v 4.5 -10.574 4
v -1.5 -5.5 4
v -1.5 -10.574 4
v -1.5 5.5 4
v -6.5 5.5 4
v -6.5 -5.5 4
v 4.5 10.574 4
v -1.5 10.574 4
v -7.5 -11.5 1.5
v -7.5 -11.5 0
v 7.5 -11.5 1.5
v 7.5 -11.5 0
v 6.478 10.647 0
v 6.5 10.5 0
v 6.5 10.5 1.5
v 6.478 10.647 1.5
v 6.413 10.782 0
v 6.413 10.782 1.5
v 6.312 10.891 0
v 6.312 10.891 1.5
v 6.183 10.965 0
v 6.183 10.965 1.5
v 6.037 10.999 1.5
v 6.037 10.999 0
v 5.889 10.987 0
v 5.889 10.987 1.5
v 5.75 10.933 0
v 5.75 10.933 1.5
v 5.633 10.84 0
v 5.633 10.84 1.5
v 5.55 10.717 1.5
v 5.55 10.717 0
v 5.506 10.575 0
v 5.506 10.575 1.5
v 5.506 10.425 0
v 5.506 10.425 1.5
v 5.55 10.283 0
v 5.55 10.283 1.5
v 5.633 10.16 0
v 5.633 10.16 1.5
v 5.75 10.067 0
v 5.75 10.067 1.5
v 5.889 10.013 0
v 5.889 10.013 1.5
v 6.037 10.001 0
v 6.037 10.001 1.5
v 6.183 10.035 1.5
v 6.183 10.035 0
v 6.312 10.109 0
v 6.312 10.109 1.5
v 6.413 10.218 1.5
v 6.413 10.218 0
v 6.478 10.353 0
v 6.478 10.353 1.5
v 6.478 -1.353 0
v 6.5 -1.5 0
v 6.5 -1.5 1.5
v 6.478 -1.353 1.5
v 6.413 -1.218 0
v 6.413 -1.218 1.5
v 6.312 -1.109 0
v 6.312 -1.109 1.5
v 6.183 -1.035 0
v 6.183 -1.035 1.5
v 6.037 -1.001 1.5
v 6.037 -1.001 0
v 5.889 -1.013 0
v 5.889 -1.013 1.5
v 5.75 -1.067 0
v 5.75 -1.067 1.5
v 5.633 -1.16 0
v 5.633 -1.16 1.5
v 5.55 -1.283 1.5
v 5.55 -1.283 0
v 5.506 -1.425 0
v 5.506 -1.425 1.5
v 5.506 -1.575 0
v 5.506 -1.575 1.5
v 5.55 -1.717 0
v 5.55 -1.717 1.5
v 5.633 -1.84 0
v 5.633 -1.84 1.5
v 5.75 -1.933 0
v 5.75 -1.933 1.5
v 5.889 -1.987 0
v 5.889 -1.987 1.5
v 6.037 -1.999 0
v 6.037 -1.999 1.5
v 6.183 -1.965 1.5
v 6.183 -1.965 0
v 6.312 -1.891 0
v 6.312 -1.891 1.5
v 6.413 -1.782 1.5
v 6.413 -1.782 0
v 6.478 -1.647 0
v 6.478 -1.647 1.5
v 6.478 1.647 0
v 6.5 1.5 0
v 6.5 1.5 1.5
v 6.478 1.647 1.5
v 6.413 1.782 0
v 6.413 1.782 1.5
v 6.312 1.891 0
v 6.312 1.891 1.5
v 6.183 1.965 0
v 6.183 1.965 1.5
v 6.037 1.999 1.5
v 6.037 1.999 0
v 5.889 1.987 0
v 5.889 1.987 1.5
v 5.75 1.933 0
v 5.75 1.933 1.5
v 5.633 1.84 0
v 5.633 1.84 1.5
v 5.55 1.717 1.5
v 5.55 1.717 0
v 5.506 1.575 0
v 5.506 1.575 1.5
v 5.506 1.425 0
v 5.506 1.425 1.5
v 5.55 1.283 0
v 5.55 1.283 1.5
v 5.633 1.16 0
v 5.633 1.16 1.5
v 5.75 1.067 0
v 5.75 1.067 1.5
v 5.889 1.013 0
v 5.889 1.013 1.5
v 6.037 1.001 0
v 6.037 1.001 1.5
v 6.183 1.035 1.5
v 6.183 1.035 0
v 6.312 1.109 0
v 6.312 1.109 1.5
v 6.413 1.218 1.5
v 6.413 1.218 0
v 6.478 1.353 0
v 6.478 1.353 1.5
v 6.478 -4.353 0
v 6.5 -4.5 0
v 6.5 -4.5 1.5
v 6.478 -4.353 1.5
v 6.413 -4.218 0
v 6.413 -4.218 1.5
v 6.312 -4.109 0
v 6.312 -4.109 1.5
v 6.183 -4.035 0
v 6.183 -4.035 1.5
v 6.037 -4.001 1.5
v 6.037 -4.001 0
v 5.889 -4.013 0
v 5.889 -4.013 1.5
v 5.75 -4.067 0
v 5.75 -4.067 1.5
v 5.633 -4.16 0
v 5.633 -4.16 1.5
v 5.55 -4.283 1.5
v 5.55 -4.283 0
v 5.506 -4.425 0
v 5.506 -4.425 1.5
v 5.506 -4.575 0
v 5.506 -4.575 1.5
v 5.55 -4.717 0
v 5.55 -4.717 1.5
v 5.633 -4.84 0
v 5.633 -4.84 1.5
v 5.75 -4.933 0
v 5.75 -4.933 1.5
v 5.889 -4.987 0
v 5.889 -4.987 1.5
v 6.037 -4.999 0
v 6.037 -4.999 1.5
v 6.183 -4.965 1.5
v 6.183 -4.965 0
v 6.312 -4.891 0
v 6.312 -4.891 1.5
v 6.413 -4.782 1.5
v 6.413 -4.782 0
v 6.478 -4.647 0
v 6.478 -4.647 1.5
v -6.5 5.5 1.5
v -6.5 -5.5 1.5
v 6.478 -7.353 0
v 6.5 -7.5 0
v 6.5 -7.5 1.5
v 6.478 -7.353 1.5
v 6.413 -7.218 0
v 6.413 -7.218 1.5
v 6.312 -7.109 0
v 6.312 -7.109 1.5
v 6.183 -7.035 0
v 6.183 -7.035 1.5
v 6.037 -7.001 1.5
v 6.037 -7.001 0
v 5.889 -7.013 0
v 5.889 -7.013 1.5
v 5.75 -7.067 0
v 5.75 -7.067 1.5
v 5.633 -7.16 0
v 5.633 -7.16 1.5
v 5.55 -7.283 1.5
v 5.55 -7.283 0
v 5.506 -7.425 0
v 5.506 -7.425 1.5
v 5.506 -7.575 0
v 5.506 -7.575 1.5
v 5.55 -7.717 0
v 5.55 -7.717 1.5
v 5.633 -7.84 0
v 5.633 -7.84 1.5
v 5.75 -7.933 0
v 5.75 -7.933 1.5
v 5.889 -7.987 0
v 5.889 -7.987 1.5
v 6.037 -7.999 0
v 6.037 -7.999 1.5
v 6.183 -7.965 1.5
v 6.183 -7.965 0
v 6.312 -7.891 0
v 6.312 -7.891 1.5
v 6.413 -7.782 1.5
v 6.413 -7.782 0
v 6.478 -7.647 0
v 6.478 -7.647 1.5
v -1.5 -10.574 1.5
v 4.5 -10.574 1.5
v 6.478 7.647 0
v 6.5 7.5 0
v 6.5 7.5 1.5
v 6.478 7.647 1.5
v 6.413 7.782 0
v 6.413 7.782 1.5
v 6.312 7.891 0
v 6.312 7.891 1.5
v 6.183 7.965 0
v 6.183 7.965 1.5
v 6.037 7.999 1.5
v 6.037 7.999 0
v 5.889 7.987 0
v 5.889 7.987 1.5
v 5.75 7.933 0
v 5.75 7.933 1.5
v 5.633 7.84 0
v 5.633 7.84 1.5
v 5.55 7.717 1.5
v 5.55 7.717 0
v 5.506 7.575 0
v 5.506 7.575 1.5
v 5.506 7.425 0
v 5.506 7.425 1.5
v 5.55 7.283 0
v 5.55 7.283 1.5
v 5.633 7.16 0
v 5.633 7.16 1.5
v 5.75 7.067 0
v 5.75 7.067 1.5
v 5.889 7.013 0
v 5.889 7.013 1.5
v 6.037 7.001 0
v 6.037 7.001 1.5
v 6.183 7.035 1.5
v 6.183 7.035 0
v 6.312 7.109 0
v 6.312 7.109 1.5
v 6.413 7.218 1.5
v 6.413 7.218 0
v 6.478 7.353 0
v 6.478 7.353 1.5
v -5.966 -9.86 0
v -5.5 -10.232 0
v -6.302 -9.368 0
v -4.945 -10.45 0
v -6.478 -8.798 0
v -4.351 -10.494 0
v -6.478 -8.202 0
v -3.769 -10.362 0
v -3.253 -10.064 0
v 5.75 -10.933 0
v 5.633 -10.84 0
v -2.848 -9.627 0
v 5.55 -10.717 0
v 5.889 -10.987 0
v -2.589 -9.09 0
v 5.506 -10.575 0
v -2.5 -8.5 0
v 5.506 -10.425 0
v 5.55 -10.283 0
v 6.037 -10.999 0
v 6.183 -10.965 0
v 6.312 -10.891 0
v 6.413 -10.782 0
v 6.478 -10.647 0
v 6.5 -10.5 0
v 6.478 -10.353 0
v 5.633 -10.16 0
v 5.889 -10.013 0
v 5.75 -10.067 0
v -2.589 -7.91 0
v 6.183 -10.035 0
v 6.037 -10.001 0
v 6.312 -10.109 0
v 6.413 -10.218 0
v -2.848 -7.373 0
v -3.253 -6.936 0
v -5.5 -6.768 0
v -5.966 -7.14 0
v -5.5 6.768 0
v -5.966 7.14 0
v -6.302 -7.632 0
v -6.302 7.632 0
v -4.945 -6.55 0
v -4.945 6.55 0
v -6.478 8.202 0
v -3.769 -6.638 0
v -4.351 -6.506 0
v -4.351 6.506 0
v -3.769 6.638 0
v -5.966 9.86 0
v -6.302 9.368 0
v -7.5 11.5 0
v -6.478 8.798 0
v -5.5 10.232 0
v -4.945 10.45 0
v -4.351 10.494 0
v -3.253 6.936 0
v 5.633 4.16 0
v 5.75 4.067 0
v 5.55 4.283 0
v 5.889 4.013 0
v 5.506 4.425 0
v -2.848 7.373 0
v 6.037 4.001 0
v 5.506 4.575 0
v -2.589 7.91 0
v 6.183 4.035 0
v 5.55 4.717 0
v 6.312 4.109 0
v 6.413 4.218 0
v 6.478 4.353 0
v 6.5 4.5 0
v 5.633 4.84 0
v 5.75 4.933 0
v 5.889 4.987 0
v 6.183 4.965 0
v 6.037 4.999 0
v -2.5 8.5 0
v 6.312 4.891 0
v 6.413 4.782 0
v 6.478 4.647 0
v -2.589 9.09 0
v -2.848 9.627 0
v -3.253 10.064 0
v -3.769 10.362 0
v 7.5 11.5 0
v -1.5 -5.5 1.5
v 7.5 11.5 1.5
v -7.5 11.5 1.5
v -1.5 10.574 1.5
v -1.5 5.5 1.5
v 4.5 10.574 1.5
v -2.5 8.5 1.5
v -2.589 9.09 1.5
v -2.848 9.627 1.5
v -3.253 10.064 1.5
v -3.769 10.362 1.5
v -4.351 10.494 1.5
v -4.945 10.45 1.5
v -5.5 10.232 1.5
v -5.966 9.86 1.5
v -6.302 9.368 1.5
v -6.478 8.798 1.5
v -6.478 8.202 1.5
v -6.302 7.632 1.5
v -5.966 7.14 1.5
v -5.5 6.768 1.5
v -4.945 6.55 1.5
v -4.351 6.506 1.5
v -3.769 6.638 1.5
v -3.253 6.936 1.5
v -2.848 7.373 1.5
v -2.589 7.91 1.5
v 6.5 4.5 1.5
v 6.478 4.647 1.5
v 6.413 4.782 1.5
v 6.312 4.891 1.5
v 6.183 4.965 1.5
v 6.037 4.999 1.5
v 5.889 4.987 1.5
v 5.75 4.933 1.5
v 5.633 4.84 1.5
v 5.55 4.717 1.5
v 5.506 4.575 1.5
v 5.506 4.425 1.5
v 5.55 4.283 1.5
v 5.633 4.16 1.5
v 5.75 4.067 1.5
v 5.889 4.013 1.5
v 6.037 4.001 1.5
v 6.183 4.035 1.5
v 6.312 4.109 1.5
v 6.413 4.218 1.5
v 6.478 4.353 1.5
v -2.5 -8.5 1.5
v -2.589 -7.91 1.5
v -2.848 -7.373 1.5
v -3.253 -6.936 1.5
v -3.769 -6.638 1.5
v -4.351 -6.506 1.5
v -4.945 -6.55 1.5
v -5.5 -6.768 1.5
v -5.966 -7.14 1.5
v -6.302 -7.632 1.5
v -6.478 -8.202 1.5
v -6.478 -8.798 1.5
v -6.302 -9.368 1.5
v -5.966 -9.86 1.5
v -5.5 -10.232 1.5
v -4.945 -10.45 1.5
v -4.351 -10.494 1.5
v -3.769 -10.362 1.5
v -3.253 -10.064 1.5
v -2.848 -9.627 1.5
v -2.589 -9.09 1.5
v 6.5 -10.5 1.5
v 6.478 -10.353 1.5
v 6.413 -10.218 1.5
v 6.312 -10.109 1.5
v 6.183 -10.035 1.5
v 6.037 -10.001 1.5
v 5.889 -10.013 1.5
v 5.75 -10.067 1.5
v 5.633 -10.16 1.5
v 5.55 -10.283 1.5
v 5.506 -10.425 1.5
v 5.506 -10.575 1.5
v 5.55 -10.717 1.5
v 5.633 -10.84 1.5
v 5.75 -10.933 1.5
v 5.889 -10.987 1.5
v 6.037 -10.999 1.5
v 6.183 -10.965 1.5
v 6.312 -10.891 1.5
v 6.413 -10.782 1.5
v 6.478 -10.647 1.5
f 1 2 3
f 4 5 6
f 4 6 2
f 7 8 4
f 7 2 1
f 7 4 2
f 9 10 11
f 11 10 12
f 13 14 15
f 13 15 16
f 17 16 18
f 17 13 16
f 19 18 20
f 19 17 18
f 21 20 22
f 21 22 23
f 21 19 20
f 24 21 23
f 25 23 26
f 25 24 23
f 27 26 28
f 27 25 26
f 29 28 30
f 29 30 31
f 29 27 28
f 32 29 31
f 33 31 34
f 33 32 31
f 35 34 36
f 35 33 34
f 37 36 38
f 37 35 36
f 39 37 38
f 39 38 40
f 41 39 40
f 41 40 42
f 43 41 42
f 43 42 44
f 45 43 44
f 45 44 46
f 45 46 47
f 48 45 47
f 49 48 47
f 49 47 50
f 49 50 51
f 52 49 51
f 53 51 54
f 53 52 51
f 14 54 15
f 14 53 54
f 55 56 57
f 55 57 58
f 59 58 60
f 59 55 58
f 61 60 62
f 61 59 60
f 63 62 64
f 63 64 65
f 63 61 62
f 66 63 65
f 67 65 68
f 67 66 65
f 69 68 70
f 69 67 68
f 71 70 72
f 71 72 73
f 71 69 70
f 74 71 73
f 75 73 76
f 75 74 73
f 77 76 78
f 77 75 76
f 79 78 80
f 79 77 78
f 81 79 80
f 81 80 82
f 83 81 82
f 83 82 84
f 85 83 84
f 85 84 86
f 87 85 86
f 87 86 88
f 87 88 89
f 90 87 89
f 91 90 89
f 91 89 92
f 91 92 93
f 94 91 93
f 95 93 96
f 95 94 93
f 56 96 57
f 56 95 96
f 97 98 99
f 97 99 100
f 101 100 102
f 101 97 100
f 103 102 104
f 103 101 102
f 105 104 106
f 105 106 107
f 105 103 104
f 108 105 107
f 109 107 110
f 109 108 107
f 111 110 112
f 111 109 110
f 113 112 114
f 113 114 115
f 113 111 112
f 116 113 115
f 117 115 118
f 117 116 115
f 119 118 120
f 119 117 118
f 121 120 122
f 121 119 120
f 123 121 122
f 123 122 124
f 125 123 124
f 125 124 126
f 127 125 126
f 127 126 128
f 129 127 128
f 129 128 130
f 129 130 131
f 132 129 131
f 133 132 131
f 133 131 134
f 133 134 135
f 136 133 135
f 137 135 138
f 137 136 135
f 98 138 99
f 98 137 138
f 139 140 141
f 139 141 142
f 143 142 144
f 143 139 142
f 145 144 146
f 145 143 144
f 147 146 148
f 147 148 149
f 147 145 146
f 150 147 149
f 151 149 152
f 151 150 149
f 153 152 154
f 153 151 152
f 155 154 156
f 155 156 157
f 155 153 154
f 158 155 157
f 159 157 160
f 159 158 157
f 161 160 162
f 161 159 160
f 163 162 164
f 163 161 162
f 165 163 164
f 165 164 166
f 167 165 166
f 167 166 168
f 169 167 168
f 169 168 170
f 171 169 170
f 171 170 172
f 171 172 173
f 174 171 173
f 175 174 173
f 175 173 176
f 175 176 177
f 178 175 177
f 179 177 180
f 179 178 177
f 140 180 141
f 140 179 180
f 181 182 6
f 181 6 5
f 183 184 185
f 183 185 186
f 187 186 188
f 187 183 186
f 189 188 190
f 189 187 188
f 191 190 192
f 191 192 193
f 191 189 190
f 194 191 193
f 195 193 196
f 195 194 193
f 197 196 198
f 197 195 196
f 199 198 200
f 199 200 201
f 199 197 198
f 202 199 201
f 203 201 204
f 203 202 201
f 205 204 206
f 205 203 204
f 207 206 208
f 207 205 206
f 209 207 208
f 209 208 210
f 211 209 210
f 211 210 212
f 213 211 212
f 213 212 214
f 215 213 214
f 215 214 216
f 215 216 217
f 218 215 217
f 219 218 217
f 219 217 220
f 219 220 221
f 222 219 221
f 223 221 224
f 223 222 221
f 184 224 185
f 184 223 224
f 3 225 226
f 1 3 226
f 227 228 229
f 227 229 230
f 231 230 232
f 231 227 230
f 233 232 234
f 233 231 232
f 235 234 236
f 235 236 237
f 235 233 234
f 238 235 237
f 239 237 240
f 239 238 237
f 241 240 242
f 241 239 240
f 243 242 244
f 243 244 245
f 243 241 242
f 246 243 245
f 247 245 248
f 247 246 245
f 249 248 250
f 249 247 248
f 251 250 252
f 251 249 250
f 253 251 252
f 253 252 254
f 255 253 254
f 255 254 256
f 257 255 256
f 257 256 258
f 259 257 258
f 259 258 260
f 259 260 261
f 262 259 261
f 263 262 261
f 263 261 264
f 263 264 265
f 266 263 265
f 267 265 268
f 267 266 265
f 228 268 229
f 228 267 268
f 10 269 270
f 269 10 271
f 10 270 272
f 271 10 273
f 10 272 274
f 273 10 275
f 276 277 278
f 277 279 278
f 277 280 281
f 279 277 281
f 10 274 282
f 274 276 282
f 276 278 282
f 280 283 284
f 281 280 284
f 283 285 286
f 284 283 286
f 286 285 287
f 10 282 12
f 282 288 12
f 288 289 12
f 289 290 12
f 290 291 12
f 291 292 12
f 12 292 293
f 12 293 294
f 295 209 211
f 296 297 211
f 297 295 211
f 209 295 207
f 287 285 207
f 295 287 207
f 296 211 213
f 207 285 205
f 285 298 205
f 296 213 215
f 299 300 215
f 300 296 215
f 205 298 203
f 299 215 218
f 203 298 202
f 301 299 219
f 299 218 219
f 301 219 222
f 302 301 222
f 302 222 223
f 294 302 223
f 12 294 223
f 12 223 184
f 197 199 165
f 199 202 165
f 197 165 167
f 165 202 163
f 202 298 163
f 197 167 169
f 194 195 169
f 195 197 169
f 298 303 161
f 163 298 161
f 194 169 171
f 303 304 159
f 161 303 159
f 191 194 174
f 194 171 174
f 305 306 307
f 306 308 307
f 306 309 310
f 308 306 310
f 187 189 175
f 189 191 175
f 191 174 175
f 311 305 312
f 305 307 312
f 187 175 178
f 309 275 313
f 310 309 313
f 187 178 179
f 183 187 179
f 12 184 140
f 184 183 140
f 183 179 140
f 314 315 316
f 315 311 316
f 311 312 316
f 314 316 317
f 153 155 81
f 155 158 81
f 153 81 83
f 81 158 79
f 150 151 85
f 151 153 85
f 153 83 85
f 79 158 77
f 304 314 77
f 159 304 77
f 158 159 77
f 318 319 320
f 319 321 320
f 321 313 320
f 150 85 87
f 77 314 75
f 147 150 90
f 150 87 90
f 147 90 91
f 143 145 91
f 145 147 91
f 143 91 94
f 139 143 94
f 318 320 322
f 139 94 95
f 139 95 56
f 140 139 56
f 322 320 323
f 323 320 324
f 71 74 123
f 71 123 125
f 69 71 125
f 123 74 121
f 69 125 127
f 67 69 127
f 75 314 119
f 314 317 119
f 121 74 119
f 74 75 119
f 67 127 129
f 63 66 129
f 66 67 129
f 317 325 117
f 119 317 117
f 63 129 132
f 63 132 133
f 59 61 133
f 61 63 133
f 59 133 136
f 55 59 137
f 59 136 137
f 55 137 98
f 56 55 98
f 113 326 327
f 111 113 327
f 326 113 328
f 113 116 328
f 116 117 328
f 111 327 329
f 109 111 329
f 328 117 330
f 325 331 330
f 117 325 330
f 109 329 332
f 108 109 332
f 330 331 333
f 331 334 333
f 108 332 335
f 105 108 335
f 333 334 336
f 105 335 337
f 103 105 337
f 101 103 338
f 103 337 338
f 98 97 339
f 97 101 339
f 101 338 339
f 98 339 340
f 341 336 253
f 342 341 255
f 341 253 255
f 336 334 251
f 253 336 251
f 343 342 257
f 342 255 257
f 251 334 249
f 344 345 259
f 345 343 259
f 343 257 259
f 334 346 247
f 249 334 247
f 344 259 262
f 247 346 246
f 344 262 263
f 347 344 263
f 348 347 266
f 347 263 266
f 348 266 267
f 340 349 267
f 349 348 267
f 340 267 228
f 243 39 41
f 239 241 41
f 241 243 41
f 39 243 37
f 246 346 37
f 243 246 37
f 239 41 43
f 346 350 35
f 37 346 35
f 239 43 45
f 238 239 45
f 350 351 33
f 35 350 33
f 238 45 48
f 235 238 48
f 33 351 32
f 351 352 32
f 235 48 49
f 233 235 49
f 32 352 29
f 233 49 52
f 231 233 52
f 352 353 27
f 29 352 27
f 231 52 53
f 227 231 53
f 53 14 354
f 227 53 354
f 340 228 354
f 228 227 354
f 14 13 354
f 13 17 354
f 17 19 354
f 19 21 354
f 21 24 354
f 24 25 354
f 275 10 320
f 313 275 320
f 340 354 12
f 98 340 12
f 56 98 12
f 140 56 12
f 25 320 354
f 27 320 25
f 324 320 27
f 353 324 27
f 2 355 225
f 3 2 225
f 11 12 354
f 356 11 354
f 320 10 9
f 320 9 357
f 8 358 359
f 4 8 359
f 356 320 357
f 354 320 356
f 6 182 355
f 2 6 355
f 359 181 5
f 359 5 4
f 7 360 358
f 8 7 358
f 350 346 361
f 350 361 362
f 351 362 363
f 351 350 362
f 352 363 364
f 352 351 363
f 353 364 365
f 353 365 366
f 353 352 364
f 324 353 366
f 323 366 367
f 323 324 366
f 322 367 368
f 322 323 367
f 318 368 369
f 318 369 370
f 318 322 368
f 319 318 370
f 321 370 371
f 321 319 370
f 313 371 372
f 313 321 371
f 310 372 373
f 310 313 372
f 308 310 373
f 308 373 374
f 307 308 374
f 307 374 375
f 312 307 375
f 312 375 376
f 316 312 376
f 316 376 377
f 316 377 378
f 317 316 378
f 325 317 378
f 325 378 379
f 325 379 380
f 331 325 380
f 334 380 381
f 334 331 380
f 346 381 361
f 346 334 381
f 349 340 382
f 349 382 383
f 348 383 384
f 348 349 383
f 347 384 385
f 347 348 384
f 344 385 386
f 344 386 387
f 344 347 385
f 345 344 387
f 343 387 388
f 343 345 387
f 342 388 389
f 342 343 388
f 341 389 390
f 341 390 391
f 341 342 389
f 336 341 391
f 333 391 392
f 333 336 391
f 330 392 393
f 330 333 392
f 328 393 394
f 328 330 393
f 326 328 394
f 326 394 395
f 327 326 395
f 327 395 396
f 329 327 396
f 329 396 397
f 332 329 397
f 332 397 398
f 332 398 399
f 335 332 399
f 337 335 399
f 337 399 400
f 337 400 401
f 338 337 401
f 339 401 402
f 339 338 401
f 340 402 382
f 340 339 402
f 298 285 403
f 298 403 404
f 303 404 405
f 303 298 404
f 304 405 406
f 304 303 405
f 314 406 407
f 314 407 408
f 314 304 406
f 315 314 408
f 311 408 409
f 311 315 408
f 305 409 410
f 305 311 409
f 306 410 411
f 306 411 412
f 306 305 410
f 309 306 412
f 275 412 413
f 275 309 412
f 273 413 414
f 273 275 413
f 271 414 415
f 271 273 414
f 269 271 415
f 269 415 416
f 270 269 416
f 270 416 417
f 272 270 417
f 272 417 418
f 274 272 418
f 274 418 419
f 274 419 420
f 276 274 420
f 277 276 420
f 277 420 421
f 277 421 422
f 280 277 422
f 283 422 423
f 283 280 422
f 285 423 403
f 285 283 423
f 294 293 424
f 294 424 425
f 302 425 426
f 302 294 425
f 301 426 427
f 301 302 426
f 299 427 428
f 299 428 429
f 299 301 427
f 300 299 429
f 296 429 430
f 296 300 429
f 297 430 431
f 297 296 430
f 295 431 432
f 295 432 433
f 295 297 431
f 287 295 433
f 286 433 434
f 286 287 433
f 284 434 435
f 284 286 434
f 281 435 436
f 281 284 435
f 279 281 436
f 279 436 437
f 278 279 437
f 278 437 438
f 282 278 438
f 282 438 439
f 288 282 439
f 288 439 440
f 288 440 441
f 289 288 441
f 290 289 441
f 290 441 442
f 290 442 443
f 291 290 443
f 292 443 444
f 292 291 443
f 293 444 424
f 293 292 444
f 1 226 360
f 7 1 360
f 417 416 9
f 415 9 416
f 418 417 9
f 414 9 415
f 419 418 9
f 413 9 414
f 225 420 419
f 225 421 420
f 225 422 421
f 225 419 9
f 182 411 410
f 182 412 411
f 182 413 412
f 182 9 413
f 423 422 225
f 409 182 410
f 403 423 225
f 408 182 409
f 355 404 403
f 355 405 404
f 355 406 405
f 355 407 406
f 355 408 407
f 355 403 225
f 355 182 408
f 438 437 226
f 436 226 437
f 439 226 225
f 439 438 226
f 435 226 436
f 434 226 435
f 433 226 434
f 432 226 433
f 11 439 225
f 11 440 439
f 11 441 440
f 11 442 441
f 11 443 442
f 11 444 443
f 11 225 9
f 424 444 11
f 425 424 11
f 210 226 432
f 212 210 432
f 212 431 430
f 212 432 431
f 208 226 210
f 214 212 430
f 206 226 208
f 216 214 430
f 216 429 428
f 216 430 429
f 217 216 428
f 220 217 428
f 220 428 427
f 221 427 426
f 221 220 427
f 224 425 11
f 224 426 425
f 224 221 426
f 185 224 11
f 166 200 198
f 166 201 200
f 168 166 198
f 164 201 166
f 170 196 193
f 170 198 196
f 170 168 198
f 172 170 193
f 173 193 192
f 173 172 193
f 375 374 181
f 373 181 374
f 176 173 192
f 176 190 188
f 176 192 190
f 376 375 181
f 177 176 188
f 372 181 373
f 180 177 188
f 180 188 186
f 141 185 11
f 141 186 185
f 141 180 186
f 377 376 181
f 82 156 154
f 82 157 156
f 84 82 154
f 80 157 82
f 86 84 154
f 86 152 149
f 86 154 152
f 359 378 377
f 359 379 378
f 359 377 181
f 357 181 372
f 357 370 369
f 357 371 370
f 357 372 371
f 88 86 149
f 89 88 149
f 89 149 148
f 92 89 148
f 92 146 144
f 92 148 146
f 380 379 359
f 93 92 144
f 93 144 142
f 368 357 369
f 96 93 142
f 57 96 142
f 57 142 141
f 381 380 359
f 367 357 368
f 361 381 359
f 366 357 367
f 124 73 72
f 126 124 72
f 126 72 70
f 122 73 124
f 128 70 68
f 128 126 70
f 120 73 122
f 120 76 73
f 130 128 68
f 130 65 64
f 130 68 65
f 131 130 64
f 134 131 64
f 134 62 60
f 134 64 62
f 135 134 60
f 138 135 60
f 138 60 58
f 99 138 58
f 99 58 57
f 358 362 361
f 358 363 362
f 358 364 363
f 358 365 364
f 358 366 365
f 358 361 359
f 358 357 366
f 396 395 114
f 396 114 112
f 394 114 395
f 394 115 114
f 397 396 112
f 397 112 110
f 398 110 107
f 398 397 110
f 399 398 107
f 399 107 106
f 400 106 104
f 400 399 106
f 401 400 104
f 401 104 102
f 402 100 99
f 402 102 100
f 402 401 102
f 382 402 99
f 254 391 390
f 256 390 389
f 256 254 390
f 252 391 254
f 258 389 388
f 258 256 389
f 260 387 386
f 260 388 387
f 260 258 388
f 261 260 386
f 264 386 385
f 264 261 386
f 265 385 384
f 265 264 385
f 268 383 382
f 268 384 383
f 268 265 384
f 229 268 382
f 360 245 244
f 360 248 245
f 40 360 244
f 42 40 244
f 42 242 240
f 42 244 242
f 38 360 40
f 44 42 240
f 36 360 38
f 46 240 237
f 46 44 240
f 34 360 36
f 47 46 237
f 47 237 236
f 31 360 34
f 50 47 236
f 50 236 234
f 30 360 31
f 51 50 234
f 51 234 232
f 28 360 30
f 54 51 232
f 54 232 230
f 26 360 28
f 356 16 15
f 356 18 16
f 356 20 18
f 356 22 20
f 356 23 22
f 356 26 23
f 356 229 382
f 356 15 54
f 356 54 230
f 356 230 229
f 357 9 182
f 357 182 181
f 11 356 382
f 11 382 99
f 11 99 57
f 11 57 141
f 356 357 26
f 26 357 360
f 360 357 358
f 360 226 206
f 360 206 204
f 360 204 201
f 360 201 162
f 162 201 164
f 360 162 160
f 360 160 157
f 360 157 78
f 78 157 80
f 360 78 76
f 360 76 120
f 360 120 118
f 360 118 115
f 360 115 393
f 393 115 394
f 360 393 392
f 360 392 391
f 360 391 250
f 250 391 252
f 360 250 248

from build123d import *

# Parameters (mm, degrees)
F0_W     = 5
F0_H     = 11
F1_DEPTH = 4
F0_W_2   = 15
F0_H_2   = 23
F0_R     = 2
F0_R_2   = 0.5
F2_DEPTH = 1.5


with BuildPart() as f1:
    # F0 (on Top) → F1 (new body)
    with BuildSketch(Plane.XY):
        Polygon((-1.5, -10.573518), (4.5, -10.573518), (4.5, 10.573518), (-1.5, 10.573518), (-1.5, 5.5), (-1.5, -5.5), align=None)
        with Locations((-4, 0)):
            Rectangle(F0_W, F0_H)
    extrude(amount=F1_DEPTH)

    # F0 (on Top) → F2 (join)
    with BuildSketch(Plane.XY):
        Rectangle(F0_W_2, F0_H_2)
        with Locations((-4.5, -8.5)):
            Circle(F0_R, mode=Mode.SUBTRACT)
        with Locations((6, -10.5)):
            Circle(F0_R_2, mode=Mode.SUBTRACT)
        with Locations((6, -7.5)):
            Circle(F0_R_2, mode=Mode.SUBTRACT)
        with Locations((6, -4.5)):
            Circle(F0_R_2, mode=Mode.SUBTRACT)
        with Locations((6, -1.5)):
            Circle(F0_R_2, mode=Mode.SUBTRACT)
        Polygon((4.5, 10.573518), (4.5, -10.573518), (-1.5, -10.573518), (-1.5, -5.5), (-6.5, -5.5), (-6.5, 5.5), (-1.5, 5.5), (-1.5, 10.573518), align=None, mode=Mode.SUBTRACT)
        with Locations((-4.5, 8.5)):
            Circle(F0_R, mode=Mode.SUBTRACT)
        with Locations((6, 1.5)):
            Circle(F0_R_2, mode=Mode.SUBTRACT)
        with Locations((6, 4.5)):
            Circle(F0_R_2, mode=Mode.SUBTRACT)
        with Locations((6, 7.5)):
            Circle(F0_R_2, mode=Mode.SUBTRACT)
        with Locations((6, 10.5)):
            Circle(F0_R_2, mode=Mode.SUBTRACT)
    extrude(amount=F2_DEPTH)


solid = f1.part
